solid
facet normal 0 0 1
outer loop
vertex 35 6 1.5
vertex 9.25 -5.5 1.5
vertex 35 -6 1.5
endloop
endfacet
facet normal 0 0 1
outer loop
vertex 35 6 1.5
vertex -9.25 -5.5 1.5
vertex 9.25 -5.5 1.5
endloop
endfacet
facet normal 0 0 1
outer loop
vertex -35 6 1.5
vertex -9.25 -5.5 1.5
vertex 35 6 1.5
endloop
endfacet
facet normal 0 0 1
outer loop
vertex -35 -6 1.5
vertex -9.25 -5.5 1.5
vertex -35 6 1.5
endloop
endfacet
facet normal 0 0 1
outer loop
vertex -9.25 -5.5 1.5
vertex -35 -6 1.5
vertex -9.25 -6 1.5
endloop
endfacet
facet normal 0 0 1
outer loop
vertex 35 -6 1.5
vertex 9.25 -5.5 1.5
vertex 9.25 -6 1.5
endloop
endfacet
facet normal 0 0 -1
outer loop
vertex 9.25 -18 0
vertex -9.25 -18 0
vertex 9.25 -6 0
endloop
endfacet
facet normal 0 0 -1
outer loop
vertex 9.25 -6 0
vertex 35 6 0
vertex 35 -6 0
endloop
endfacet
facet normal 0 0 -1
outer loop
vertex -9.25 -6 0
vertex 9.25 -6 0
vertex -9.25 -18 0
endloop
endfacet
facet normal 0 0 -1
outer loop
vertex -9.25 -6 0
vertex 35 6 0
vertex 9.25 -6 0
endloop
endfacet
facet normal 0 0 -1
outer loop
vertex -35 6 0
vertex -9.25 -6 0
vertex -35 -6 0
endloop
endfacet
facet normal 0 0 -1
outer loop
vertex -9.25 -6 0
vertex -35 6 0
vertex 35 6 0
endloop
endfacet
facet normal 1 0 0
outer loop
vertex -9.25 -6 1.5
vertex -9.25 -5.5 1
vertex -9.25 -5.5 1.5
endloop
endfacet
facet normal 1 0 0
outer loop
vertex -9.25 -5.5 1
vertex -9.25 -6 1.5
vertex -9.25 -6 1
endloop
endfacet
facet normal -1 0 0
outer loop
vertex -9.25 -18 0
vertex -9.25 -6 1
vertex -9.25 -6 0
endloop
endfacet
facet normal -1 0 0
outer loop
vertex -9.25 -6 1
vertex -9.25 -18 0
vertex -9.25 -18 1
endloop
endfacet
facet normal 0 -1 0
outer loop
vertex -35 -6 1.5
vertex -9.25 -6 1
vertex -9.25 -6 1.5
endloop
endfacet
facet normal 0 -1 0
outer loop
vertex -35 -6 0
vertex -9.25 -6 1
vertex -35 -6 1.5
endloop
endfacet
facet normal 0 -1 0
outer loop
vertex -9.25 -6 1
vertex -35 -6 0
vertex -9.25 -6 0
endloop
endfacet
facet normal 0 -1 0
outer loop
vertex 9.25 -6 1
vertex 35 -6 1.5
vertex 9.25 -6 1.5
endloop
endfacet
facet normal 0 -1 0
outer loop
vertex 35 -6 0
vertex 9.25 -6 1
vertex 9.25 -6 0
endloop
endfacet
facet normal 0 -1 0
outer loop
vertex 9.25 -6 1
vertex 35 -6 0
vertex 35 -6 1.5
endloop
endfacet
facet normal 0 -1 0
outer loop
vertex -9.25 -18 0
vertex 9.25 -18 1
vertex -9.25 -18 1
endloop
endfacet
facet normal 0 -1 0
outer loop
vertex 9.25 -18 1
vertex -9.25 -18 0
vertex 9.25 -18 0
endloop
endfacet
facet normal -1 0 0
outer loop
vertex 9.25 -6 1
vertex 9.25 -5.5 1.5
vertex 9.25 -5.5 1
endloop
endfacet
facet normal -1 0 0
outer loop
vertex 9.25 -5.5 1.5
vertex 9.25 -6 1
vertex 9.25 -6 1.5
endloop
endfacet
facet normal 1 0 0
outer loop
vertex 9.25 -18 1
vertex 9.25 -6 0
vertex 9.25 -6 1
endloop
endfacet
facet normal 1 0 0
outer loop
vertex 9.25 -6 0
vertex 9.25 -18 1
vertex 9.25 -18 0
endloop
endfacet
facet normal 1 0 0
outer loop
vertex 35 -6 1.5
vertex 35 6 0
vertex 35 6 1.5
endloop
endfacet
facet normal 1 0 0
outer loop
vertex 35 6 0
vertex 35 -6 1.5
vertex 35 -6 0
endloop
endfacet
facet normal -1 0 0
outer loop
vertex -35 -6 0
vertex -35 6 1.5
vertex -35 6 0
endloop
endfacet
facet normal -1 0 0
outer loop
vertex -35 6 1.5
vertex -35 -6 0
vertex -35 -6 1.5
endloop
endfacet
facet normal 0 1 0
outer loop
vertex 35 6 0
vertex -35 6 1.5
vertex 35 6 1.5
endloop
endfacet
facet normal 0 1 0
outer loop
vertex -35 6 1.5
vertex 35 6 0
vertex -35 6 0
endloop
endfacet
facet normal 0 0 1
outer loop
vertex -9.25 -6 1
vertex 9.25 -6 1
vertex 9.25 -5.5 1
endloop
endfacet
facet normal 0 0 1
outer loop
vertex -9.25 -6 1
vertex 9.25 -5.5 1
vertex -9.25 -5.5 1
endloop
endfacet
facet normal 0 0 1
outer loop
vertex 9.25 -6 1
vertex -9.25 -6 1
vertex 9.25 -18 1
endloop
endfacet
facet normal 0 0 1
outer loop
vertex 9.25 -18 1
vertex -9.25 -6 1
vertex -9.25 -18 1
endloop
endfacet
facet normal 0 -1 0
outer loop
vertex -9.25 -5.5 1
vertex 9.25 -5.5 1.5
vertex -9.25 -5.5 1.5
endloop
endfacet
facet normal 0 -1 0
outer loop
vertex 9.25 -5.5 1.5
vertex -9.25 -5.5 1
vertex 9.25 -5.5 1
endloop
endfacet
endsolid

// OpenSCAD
// 10-well comb for casting agarose gels, printed lying flat
// Units: mm. Plate thickness (Z) = 1.5 mm.

$fn = 64;

// ---- Spine (back bar) ----
spine_len   = 70;   // spine length along X
spine_wid   = 12;   // spine width along Y

// ---- Teeth ----
tooth_count = 10;   // number of wells
tooth_w     = 5.0;  // tooth width along X
tooth_l     = 12;   // tooth length along Y (same as spine width)

// ---- Pitch ----
pitch       = 1.5;  // centre-to-centre spacing of teeth along X

// ---- Misc ----
eps         = 0.5;  // cutter overshoot past faces
plate_t     = 1.5;  // plate thickness (Z)

// First tooth centre, so the row is centred on the spine
x0 = -(tooth_count - 1) * pitch / 2;

difference() {
    // Plate: spine + teeth, resting on z = 0
    union() {
        translate([-spine_len / 2, -spine_wid / 2, 0])
            cube([spine_len, spine_wid, plate_t]);
        for (i = [0 : tooth_count - 1])
            translate([x0 + i * pitch - tooth_w / 2,
                       -spine_wid / 2 - tooth_l, 0])
                cube([tooth_w, tooth_l, plate_t]);
    }

    // Cut the wells through the top face (z = plate_t)
    for (i = [0 : tooth_count - 1])
        translate([x0 + i * pitch - tooth_w / 2,
                   -spine_wid / 2 - tooth_l - eps,
                   plate_t - eps])
            cube([tooth_w, tooth_l + 2 * eps, 2 * eps]);
}
